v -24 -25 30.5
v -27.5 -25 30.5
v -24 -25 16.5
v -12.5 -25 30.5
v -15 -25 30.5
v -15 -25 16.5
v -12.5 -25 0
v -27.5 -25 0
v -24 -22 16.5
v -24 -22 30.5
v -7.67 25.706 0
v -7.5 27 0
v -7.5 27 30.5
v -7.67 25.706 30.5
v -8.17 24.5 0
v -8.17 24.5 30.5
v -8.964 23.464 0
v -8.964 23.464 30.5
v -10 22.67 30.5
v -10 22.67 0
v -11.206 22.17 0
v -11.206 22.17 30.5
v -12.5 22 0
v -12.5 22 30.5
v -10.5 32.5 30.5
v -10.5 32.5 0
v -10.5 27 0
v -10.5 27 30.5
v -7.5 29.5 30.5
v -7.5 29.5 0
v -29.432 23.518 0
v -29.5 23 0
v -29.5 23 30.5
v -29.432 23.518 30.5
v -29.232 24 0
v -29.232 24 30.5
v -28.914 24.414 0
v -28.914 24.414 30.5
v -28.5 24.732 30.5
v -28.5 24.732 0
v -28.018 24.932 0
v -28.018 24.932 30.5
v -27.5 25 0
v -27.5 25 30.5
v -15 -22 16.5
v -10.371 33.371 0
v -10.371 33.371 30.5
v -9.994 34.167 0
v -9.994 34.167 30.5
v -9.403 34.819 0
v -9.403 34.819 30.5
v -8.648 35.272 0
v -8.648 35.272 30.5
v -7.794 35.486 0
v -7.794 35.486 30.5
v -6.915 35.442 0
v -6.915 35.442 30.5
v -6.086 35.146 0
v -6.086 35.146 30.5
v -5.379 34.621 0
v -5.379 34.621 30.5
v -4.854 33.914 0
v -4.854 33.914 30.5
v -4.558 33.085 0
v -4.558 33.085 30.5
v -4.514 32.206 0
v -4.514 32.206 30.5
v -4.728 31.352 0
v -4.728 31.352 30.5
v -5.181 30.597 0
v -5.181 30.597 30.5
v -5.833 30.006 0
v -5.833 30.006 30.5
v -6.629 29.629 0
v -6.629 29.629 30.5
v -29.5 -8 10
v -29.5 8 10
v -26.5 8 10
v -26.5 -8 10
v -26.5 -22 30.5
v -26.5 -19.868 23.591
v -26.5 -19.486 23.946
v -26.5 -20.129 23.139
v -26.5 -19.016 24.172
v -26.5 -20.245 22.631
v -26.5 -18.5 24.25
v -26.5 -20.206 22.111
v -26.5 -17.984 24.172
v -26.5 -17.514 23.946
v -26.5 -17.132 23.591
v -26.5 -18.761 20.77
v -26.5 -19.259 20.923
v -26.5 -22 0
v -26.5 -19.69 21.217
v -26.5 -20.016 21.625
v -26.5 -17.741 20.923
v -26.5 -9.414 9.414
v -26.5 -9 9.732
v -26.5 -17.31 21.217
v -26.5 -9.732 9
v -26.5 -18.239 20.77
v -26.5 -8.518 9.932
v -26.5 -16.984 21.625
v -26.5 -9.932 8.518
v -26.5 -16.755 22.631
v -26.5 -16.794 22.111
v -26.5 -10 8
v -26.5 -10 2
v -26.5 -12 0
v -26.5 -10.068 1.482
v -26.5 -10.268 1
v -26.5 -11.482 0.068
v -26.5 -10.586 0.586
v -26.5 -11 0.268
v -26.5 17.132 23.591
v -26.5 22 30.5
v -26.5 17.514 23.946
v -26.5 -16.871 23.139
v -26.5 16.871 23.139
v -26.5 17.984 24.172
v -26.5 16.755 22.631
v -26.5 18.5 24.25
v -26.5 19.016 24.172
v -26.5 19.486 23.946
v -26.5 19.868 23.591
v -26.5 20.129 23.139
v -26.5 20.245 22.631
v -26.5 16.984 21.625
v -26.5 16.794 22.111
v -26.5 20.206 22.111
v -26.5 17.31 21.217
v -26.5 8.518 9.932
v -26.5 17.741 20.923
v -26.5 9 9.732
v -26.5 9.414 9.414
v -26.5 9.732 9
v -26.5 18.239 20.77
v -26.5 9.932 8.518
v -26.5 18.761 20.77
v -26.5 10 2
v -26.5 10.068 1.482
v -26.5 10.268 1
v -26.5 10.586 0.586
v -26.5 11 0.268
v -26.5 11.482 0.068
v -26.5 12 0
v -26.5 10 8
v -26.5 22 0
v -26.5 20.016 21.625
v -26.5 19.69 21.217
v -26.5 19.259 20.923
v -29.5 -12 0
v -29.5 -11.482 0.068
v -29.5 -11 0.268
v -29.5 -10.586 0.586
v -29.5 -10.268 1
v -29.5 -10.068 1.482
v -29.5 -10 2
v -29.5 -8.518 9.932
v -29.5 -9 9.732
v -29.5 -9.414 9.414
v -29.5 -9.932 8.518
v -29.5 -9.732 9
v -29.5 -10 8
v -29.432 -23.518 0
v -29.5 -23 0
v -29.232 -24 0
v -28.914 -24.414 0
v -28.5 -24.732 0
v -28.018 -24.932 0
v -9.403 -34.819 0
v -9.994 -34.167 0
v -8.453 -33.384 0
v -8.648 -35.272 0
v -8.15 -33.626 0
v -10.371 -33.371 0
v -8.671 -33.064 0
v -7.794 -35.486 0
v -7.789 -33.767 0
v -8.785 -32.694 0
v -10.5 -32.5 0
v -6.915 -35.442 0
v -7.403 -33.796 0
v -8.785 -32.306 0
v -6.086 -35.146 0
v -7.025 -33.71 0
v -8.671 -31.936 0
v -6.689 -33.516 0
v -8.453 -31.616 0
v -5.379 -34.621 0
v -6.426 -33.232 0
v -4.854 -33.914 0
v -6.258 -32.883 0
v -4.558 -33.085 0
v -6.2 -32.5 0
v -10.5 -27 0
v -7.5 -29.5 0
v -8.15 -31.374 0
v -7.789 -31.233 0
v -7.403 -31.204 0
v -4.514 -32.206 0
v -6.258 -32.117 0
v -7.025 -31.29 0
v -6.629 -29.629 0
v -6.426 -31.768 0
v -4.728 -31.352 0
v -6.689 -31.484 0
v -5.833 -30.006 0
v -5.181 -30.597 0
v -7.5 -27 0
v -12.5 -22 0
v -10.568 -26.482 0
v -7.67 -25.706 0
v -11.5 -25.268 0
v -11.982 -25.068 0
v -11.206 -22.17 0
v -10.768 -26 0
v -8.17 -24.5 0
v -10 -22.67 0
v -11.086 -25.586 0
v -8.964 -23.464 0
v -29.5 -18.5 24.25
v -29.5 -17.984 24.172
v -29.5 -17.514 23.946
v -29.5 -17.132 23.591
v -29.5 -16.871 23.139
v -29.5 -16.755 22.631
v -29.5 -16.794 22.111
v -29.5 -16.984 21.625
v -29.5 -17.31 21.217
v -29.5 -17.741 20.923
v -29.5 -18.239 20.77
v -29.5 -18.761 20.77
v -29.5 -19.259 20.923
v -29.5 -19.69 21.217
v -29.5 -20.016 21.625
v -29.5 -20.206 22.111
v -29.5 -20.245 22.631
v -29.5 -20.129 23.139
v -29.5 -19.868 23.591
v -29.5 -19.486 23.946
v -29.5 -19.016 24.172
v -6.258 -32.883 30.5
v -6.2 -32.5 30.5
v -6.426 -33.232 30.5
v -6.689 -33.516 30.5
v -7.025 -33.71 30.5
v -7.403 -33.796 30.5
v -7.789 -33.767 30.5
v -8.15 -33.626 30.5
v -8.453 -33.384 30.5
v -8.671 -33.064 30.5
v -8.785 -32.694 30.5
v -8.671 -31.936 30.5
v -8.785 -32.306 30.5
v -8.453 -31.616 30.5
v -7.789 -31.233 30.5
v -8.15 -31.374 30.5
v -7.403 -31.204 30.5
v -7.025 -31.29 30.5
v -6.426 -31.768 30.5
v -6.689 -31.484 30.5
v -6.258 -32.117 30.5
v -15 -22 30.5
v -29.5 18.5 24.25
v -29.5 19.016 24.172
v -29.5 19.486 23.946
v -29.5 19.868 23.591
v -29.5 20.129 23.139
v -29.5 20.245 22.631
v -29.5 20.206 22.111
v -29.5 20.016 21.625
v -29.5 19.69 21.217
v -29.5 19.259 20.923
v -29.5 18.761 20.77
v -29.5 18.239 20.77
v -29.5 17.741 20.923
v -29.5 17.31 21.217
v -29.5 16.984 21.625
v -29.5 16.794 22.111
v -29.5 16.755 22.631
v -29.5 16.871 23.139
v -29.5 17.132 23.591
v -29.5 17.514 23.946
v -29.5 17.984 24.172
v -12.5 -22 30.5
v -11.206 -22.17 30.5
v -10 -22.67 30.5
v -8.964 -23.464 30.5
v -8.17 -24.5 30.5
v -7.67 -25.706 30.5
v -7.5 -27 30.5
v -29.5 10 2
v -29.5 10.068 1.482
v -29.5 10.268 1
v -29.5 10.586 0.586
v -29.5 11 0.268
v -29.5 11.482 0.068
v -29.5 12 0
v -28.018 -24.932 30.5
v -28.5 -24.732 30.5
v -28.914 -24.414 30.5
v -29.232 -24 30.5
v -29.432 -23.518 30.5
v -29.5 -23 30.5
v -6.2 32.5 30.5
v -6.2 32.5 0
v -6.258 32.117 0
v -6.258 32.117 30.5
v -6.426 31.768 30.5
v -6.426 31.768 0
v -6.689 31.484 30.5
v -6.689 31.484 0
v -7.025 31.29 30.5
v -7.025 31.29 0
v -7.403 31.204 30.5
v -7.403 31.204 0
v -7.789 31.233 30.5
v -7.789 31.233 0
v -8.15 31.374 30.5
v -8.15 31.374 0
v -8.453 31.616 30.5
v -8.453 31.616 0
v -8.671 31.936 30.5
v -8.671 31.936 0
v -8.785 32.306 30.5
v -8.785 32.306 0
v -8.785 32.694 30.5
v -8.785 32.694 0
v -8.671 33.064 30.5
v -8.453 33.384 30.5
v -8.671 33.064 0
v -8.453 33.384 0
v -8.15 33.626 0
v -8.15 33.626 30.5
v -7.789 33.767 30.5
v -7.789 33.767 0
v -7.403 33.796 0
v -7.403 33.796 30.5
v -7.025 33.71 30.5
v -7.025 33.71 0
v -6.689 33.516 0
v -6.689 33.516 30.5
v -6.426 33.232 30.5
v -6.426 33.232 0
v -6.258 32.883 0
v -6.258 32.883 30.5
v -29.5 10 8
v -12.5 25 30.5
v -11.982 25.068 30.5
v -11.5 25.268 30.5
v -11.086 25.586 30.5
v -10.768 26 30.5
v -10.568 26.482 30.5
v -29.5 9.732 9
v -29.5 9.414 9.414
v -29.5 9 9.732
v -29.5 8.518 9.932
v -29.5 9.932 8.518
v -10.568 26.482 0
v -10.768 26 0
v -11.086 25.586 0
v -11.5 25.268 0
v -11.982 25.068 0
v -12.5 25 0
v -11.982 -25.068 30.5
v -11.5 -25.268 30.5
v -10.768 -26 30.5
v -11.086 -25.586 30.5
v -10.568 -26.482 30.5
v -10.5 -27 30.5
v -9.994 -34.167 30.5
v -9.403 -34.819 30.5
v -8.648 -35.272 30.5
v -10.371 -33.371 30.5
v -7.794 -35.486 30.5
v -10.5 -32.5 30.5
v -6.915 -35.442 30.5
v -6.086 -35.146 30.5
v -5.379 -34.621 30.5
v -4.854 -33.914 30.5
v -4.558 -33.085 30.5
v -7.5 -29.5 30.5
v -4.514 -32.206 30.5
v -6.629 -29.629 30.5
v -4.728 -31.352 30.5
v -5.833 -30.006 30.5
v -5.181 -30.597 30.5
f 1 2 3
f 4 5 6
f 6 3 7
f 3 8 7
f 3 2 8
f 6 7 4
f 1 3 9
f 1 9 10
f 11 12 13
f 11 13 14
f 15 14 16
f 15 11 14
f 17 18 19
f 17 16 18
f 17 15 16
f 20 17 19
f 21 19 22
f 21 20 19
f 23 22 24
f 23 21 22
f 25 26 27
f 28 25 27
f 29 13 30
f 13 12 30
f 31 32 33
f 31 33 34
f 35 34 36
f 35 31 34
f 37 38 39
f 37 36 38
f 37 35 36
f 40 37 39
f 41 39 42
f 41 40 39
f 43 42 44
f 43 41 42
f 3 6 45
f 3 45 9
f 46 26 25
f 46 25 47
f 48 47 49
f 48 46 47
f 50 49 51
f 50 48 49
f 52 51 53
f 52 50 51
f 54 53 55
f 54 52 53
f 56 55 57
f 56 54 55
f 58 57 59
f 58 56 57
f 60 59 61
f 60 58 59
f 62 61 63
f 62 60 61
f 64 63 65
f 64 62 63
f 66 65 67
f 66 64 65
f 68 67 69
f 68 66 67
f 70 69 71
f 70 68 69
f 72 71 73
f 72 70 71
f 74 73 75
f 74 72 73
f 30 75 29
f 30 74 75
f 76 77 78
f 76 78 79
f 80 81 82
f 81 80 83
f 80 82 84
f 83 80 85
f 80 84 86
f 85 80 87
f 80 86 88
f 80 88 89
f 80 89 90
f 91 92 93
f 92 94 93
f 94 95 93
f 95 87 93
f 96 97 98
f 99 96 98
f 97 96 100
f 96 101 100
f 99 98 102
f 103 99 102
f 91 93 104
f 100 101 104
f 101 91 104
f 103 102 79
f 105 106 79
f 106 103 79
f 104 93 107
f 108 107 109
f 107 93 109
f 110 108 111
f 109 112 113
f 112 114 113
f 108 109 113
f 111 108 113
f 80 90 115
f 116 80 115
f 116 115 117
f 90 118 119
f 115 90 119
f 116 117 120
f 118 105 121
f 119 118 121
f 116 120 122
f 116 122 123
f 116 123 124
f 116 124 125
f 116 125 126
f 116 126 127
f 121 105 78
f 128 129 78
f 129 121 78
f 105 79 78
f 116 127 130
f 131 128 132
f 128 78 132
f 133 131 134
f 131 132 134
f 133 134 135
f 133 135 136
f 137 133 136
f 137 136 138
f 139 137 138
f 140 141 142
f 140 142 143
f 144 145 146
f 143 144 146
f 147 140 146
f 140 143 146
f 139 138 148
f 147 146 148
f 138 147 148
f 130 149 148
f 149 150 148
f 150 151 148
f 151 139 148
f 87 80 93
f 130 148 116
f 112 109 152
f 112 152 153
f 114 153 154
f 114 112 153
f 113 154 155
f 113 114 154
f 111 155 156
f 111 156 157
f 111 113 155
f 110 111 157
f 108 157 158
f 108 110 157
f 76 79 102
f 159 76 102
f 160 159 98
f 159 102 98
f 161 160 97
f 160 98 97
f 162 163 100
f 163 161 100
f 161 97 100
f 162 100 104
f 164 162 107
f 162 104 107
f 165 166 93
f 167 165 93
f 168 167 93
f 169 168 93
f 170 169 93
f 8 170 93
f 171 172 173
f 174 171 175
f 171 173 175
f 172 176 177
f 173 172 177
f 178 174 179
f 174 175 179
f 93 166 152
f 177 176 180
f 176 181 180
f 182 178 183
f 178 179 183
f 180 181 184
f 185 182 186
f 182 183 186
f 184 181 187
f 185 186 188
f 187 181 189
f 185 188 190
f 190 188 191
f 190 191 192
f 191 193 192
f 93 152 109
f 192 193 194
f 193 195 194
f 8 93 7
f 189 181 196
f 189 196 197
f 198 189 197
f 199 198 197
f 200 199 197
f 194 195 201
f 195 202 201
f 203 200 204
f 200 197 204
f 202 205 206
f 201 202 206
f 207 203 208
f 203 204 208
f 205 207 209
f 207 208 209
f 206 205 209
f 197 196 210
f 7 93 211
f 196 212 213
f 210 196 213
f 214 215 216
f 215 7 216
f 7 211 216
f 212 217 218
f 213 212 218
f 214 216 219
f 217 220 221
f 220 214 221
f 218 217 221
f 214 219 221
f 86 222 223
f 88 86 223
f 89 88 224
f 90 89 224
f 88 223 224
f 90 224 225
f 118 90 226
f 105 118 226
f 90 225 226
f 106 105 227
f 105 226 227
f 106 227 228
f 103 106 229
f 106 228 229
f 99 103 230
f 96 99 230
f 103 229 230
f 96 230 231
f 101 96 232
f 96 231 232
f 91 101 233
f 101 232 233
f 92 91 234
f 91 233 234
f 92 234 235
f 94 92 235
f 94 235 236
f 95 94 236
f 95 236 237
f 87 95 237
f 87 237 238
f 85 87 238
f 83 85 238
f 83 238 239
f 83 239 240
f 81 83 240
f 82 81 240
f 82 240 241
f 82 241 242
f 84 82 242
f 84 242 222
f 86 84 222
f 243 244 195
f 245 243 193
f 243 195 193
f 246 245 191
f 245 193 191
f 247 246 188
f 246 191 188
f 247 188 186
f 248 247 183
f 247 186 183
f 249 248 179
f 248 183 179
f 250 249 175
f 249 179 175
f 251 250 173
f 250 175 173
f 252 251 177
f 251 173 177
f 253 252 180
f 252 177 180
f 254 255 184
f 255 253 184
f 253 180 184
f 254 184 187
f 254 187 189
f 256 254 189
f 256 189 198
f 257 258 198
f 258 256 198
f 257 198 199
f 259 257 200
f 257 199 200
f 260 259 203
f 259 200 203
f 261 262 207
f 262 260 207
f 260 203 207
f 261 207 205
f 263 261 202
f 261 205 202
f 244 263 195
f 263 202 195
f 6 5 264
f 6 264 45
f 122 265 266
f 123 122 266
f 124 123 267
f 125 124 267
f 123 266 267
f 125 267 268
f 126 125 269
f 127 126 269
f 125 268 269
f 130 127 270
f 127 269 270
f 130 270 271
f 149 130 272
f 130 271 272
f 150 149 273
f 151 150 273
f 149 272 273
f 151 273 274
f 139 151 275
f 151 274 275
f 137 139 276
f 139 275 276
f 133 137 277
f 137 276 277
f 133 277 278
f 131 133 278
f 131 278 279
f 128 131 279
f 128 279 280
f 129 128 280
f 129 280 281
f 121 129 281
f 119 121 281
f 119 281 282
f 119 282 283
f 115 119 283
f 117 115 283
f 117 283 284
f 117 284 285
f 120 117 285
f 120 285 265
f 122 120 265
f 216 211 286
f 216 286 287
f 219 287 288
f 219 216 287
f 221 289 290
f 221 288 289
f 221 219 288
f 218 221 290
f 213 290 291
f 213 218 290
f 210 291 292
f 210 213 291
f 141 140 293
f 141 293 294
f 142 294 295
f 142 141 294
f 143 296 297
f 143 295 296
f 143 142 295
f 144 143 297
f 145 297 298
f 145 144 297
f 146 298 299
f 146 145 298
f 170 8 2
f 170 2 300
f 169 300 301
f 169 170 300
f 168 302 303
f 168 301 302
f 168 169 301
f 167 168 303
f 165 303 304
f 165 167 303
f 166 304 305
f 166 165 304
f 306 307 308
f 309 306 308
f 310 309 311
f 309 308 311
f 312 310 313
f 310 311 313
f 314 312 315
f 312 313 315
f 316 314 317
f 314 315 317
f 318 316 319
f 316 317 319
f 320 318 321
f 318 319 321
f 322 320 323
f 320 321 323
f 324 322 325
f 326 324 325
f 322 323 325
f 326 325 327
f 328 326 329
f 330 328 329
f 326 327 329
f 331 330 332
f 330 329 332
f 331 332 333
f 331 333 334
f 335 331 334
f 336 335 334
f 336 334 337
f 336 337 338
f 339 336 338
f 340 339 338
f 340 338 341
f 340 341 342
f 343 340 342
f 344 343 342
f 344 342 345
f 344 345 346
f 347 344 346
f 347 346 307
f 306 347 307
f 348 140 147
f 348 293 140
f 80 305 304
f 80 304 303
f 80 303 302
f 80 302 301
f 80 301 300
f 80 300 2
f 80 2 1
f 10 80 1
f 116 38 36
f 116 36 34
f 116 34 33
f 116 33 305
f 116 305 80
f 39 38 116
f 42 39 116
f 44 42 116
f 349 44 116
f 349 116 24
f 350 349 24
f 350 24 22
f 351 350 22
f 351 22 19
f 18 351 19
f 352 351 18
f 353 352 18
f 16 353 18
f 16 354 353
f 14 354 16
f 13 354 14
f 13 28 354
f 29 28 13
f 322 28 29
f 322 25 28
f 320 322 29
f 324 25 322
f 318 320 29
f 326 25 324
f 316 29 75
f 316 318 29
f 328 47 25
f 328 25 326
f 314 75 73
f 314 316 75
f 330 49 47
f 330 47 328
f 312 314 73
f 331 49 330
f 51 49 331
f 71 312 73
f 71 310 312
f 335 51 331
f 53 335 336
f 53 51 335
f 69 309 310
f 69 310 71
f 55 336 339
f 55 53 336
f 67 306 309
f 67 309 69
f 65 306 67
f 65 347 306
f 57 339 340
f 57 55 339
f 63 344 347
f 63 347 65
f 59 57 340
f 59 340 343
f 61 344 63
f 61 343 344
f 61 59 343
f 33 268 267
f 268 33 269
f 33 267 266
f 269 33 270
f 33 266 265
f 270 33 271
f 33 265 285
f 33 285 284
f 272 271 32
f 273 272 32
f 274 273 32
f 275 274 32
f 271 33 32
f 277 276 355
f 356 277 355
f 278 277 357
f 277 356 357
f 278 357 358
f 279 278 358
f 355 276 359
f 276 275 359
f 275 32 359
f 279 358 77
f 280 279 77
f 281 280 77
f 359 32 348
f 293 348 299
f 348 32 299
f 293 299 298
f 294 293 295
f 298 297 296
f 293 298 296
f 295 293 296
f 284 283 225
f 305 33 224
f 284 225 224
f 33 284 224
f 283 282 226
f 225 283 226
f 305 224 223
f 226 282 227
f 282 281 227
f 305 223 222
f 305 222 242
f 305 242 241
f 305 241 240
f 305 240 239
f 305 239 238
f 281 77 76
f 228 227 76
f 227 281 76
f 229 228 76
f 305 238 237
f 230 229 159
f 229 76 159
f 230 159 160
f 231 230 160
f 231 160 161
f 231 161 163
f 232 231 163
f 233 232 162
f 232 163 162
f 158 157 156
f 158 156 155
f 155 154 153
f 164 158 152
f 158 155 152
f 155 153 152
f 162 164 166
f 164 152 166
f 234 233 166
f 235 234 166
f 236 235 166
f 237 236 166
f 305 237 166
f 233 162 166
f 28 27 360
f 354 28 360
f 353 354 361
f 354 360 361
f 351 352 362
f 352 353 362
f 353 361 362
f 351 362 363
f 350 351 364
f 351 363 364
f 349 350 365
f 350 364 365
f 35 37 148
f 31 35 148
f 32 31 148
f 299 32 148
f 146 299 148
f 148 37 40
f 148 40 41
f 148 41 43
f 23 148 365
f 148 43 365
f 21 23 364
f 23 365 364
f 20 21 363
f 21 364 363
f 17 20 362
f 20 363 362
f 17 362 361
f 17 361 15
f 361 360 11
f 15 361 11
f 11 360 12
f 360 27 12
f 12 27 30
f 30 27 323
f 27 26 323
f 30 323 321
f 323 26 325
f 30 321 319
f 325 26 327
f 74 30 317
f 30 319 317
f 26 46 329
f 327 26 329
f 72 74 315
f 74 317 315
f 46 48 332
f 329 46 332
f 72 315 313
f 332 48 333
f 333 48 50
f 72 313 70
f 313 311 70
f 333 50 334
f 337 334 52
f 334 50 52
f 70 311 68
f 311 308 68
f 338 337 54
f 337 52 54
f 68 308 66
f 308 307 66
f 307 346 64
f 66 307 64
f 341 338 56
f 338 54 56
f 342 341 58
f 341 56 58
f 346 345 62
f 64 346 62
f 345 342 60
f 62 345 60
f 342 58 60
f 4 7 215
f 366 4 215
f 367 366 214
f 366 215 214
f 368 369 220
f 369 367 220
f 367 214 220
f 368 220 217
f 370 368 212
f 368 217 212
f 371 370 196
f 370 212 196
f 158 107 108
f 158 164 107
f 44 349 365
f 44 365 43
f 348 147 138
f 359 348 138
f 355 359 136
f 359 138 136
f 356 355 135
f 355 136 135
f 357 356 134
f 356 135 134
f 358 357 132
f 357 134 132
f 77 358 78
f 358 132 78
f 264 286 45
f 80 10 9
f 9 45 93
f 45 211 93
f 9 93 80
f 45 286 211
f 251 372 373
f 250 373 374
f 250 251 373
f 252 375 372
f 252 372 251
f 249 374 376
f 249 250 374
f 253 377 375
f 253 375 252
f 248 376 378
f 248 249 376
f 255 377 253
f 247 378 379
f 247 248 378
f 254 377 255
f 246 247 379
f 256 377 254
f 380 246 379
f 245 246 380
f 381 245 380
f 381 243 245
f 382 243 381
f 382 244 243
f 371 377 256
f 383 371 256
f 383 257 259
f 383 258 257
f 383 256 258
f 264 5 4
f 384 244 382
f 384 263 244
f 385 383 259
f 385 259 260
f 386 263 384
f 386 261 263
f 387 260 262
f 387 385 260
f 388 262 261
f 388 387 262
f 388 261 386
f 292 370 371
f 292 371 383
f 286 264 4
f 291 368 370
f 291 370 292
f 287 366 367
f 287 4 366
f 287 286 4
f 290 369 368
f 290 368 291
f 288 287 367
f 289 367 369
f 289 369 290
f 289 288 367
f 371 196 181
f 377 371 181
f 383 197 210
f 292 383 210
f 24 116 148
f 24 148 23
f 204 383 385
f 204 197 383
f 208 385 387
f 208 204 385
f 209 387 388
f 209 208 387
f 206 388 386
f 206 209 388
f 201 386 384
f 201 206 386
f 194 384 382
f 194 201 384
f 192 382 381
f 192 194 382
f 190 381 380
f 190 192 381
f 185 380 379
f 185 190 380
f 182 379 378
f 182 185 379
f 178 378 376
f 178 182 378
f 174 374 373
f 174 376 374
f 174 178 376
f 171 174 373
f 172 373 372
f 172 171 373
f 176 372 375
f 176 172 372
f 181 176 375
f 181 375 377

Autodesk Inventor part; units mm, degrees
ref_plane "YZ Plane" through (0, 0, 0) normal (1, 0, 0) x (0, 1, 0)
ref_plane "XZ Plane" through (0, 0, 0) normal (0, 1, 0) x (-1, 0, 0)
sketch "スケッチ1" plane through (0, 0, 0) normal (0, 0, 1) x (1, 0, 0)
  circle A0 centre (-7.5, -32.5) radius 1.6 projected
  circle A1 centre (-7.5, 32.5) radius 1.6 projected
  circle A2 centre (-7.5, -32.5) radius 1.3
  circle A3 centre (-7.5, 32.5) radius 1.3
  circle A4 centre (-7.5, 32.5) radius 3
  circle A5 centre (-7.5, -32.5) radius 3
  circle A6 centre (-7.5, 32.5) radius 1.6 projected
  circle A7 centre (7.5, -32.5) radius 1.6 projected
  circle A8 centre (7.5, 32.5) radius 1.6 projected
  circle A9 centre (-7.5, -32.5) radius 1.6 projected
  circle A10 centre (15.5, 0) radius 1.1 projected
  circle A11 centre (10.5, -5) radius 1.1 projected
  circle A12 centre (5.5, 0) radius 1.1 projected
  circle A13 centre (10.5, 5) radius 1.1 projected
  arc A14 (-10.5, -38) -> (-8.5, -40) centre (-8.5, -38) ccw projected
  line L0 (-8.5, -40) -> (8.5, -40) projected
  arc A15 (8.5, -40) -> (10.5, -38) centre (8.5, -38) ccw projected
  line L1 (10.5, -38) -> (10.5, -27) projected
  arc A16 (12.5, -25) -> (10.5, -27) centre (12.5, -27) ccw projected
  line L2 (12.5, -25) -> (18.5, -25) projected
  arc A17 (18.5, -25) -> (20.5, -23) centre (18.5, -23) ccw projected
  line L3 (20.5, -23) -> (20.5, 23) projected
  arc A18 (20.5, 23) -> (18.5, 25) centre (18.5, 23) ccw projected
  line L4 (18.5, 25) -> (12.5, 25) projected
  arc A19 (10.5, 27) -> (12.5, 25) centre (12.5, 27) ccw projected
  line L5 (10.5, 27) -> (10.5, 38) projected
  arc A20 (10.5, 38) -> (8.5, 40) centre (8.5, 38) ccw projected
  line L6 (8.5, 40) -> (-8.5, 40) projected
  arc A21 (-8.5, 40) -> (-10.5, 38) centre (-8.5, 38) ccw projected
  line L7 (-10.5, 38) -> (-10.5, 27) projected
  arc A22 (-12.5, 25) -> (-10.5, 27) centre (-12.5, 27) ccw projected
  line L8 (-12.5, 25) -> (-27.5, 25) projected
  arc A23 (-27.5, 25) -> (-29.5, 23) centre (-27.5, 23) ccw projected
  line L9 (-29.5, 23) -> (-29.5, -23) projected
  arc A24 (-29.5, -23) -> (-27.5, -25) centre (-27.5, -23) ccw projected
  line L10 (-27.5, -25) -> (-12.5, -25) projected
  arc A25 (-10.5, -27) -> (-12.5, -25) centre (-12.5, -27) ccw projected
  line L11 (-10.5, -27) -> (-10.5, -38) projected
  circle A26 centre (-8, 38) radius 1.1 projected
  circle A27 centre (-8, -38) radius 1.1 projected
  circle A28 centre (8, -38) radius 1.1 projected
  circle A29 centre (8, 38) radius 1.1 projected
  line L12 (-12.5, -22) -> (-26.5, -22)
  line L13 (-26.5, -22) -> (-26.5, 22)
  line L14 (-26.5, 22) -> (-12.5, 22)
  arc A30 (-12.5, 22) -> (-7.5, 27) centre (-12.5, 27) ccw
  line L15 (-7.5, 27) -> (-7.5, 37)
  line L16 (-7.5, 37) -> (7.5, 37)
  line L17 (7.5, 37) -> (7.5, 27)
  arc A31 (7.5, 27) -> (12.5, 22) centre (12.5, 27) ccw
  line L18 (12.5, 22) -> (17.5, 22)
  line L19 (17.5, 22) -> (17.5, -22)
  line L20 (17.5, -22) -> (12.5, -22)
  arc A32 (12.5, -22) -> (7.5, -27) centre (12.5, -27) ccw
  line L21 (7.5, -27) -> (7.5, -37)
  line L22 (7.5, -37) -> (-7.5, -37)
  line L23 (-7.5, -37) -> (-7.5, -27)
  arc A33 (-7.5, -27) -> (-12.5, -22) centre (-12.5, -27) ccw
  point P0 (0, 0)
  point P1 (-7.5, 29.5)
  point P2 (-10.5, 32.5)
  point P3 (-10.5, -32.5)
  point P4 (-7.5, -29.5)
  dimension "d0" = 2.6
  dimension "d1" = 2.6
  dimension "d2" = 6
  dimension "d3" = 6
  dimension "d4" = 3
ref_plane "作業平面1" through (-29.5, -40, 30.5) normal (0, 0, -1) x (0, 1, 0)
extrude "押し出し1" add sketch "スケッチ1" along normal up to surface (30.5 mm away) contours A0 L23 A2 | A0 L23 A5 | L23 A2 A0 | A0 L23 A5 | A5 L11 A25 L10 A24 L9 A23 L8 A22 L7 A4 L15 A30 L14 L13 L12 A33 L23 | L15 A1 A4 | A4 L15 A1 | L15 A3 A1 | A1 L15 A3
sketch "スケッチ2" plane through (-29.5, -23, 0) normal (-1, 0, 0) x (0, 0, 1)
  line L0 (0, 33) -> (10, 33)
  line L1 (10, 33) -> (10, 13)
  line L2 (10, 13) -> (0, 13)
  line L3 (0, 13) -> (0, 33)
  line L4 (0, 46) -> (0, 0) projected
  point P0 (0, 23)
  point P1 (10, 23)
  point P2 (0, 23)
  point P3 (0, 23)
  dimension "d7" = 10
  dimension "d8" = 20
extrude "押し出し2" cut sketch "スケッチ2" against normal through all
fillet "フィレット1" radius 2 4 edges at (-28, 10, 10) (-28, 10, 0) (-28, -10, 10) (-28, -10, 0)
sketch "スケッチ3" plane through (-27.5, -25, 0) normal (0, -1, 0) x (1, 0, 0)
  line L0 (15, 30.5) -> (1, 30.5) projected
  line L1 (3.5, 30.5) -> (12.5, 30.5)
  line L2 (12.5, 30.5) -> (12.5, 16.5)
  line L3 (12.5, 16.5) -> (3.5, 16.5)
  line L4 (3.5, 16.5) -> (3.5, 30.5)
  point P0 (27.5, 0)
  point P1 (8, 30.5)
  point P2 (8, 16.5)
  point P3 (12.5, 30.5)
  dimension "d12" = 9
  dimension "d13" = 14
extrude "押し出し3" cut sketch "スケッチ3" against normal up to surface (3 mm away)
sketch "スケッチ4" plane through (-29.5, -23, 30.5) normal (-1, 0, 0) x (0, 0, 1)
  circle A0 centre (-8, 41.5) radius 1.75
  circle A1 centre (-8, 4.5) radius 1.75
  line L0 (0, 46) -> (0, 0) projected
  point P0 (-30.5, 23)
  point P1 (0, 23)
  dimension "d16" = 3.5
  dimension "d17" = 3.5
  dimension "d18" = 37
  dimension "d19" = 18.5
  dimension "d20" = 8
extrude "押し出し4" cut sketch "スケッチ4" against normal through all
equation "\"d19\" = 0.5 * d18"
properties part number "mune_2" material "ABS プラスチック"
